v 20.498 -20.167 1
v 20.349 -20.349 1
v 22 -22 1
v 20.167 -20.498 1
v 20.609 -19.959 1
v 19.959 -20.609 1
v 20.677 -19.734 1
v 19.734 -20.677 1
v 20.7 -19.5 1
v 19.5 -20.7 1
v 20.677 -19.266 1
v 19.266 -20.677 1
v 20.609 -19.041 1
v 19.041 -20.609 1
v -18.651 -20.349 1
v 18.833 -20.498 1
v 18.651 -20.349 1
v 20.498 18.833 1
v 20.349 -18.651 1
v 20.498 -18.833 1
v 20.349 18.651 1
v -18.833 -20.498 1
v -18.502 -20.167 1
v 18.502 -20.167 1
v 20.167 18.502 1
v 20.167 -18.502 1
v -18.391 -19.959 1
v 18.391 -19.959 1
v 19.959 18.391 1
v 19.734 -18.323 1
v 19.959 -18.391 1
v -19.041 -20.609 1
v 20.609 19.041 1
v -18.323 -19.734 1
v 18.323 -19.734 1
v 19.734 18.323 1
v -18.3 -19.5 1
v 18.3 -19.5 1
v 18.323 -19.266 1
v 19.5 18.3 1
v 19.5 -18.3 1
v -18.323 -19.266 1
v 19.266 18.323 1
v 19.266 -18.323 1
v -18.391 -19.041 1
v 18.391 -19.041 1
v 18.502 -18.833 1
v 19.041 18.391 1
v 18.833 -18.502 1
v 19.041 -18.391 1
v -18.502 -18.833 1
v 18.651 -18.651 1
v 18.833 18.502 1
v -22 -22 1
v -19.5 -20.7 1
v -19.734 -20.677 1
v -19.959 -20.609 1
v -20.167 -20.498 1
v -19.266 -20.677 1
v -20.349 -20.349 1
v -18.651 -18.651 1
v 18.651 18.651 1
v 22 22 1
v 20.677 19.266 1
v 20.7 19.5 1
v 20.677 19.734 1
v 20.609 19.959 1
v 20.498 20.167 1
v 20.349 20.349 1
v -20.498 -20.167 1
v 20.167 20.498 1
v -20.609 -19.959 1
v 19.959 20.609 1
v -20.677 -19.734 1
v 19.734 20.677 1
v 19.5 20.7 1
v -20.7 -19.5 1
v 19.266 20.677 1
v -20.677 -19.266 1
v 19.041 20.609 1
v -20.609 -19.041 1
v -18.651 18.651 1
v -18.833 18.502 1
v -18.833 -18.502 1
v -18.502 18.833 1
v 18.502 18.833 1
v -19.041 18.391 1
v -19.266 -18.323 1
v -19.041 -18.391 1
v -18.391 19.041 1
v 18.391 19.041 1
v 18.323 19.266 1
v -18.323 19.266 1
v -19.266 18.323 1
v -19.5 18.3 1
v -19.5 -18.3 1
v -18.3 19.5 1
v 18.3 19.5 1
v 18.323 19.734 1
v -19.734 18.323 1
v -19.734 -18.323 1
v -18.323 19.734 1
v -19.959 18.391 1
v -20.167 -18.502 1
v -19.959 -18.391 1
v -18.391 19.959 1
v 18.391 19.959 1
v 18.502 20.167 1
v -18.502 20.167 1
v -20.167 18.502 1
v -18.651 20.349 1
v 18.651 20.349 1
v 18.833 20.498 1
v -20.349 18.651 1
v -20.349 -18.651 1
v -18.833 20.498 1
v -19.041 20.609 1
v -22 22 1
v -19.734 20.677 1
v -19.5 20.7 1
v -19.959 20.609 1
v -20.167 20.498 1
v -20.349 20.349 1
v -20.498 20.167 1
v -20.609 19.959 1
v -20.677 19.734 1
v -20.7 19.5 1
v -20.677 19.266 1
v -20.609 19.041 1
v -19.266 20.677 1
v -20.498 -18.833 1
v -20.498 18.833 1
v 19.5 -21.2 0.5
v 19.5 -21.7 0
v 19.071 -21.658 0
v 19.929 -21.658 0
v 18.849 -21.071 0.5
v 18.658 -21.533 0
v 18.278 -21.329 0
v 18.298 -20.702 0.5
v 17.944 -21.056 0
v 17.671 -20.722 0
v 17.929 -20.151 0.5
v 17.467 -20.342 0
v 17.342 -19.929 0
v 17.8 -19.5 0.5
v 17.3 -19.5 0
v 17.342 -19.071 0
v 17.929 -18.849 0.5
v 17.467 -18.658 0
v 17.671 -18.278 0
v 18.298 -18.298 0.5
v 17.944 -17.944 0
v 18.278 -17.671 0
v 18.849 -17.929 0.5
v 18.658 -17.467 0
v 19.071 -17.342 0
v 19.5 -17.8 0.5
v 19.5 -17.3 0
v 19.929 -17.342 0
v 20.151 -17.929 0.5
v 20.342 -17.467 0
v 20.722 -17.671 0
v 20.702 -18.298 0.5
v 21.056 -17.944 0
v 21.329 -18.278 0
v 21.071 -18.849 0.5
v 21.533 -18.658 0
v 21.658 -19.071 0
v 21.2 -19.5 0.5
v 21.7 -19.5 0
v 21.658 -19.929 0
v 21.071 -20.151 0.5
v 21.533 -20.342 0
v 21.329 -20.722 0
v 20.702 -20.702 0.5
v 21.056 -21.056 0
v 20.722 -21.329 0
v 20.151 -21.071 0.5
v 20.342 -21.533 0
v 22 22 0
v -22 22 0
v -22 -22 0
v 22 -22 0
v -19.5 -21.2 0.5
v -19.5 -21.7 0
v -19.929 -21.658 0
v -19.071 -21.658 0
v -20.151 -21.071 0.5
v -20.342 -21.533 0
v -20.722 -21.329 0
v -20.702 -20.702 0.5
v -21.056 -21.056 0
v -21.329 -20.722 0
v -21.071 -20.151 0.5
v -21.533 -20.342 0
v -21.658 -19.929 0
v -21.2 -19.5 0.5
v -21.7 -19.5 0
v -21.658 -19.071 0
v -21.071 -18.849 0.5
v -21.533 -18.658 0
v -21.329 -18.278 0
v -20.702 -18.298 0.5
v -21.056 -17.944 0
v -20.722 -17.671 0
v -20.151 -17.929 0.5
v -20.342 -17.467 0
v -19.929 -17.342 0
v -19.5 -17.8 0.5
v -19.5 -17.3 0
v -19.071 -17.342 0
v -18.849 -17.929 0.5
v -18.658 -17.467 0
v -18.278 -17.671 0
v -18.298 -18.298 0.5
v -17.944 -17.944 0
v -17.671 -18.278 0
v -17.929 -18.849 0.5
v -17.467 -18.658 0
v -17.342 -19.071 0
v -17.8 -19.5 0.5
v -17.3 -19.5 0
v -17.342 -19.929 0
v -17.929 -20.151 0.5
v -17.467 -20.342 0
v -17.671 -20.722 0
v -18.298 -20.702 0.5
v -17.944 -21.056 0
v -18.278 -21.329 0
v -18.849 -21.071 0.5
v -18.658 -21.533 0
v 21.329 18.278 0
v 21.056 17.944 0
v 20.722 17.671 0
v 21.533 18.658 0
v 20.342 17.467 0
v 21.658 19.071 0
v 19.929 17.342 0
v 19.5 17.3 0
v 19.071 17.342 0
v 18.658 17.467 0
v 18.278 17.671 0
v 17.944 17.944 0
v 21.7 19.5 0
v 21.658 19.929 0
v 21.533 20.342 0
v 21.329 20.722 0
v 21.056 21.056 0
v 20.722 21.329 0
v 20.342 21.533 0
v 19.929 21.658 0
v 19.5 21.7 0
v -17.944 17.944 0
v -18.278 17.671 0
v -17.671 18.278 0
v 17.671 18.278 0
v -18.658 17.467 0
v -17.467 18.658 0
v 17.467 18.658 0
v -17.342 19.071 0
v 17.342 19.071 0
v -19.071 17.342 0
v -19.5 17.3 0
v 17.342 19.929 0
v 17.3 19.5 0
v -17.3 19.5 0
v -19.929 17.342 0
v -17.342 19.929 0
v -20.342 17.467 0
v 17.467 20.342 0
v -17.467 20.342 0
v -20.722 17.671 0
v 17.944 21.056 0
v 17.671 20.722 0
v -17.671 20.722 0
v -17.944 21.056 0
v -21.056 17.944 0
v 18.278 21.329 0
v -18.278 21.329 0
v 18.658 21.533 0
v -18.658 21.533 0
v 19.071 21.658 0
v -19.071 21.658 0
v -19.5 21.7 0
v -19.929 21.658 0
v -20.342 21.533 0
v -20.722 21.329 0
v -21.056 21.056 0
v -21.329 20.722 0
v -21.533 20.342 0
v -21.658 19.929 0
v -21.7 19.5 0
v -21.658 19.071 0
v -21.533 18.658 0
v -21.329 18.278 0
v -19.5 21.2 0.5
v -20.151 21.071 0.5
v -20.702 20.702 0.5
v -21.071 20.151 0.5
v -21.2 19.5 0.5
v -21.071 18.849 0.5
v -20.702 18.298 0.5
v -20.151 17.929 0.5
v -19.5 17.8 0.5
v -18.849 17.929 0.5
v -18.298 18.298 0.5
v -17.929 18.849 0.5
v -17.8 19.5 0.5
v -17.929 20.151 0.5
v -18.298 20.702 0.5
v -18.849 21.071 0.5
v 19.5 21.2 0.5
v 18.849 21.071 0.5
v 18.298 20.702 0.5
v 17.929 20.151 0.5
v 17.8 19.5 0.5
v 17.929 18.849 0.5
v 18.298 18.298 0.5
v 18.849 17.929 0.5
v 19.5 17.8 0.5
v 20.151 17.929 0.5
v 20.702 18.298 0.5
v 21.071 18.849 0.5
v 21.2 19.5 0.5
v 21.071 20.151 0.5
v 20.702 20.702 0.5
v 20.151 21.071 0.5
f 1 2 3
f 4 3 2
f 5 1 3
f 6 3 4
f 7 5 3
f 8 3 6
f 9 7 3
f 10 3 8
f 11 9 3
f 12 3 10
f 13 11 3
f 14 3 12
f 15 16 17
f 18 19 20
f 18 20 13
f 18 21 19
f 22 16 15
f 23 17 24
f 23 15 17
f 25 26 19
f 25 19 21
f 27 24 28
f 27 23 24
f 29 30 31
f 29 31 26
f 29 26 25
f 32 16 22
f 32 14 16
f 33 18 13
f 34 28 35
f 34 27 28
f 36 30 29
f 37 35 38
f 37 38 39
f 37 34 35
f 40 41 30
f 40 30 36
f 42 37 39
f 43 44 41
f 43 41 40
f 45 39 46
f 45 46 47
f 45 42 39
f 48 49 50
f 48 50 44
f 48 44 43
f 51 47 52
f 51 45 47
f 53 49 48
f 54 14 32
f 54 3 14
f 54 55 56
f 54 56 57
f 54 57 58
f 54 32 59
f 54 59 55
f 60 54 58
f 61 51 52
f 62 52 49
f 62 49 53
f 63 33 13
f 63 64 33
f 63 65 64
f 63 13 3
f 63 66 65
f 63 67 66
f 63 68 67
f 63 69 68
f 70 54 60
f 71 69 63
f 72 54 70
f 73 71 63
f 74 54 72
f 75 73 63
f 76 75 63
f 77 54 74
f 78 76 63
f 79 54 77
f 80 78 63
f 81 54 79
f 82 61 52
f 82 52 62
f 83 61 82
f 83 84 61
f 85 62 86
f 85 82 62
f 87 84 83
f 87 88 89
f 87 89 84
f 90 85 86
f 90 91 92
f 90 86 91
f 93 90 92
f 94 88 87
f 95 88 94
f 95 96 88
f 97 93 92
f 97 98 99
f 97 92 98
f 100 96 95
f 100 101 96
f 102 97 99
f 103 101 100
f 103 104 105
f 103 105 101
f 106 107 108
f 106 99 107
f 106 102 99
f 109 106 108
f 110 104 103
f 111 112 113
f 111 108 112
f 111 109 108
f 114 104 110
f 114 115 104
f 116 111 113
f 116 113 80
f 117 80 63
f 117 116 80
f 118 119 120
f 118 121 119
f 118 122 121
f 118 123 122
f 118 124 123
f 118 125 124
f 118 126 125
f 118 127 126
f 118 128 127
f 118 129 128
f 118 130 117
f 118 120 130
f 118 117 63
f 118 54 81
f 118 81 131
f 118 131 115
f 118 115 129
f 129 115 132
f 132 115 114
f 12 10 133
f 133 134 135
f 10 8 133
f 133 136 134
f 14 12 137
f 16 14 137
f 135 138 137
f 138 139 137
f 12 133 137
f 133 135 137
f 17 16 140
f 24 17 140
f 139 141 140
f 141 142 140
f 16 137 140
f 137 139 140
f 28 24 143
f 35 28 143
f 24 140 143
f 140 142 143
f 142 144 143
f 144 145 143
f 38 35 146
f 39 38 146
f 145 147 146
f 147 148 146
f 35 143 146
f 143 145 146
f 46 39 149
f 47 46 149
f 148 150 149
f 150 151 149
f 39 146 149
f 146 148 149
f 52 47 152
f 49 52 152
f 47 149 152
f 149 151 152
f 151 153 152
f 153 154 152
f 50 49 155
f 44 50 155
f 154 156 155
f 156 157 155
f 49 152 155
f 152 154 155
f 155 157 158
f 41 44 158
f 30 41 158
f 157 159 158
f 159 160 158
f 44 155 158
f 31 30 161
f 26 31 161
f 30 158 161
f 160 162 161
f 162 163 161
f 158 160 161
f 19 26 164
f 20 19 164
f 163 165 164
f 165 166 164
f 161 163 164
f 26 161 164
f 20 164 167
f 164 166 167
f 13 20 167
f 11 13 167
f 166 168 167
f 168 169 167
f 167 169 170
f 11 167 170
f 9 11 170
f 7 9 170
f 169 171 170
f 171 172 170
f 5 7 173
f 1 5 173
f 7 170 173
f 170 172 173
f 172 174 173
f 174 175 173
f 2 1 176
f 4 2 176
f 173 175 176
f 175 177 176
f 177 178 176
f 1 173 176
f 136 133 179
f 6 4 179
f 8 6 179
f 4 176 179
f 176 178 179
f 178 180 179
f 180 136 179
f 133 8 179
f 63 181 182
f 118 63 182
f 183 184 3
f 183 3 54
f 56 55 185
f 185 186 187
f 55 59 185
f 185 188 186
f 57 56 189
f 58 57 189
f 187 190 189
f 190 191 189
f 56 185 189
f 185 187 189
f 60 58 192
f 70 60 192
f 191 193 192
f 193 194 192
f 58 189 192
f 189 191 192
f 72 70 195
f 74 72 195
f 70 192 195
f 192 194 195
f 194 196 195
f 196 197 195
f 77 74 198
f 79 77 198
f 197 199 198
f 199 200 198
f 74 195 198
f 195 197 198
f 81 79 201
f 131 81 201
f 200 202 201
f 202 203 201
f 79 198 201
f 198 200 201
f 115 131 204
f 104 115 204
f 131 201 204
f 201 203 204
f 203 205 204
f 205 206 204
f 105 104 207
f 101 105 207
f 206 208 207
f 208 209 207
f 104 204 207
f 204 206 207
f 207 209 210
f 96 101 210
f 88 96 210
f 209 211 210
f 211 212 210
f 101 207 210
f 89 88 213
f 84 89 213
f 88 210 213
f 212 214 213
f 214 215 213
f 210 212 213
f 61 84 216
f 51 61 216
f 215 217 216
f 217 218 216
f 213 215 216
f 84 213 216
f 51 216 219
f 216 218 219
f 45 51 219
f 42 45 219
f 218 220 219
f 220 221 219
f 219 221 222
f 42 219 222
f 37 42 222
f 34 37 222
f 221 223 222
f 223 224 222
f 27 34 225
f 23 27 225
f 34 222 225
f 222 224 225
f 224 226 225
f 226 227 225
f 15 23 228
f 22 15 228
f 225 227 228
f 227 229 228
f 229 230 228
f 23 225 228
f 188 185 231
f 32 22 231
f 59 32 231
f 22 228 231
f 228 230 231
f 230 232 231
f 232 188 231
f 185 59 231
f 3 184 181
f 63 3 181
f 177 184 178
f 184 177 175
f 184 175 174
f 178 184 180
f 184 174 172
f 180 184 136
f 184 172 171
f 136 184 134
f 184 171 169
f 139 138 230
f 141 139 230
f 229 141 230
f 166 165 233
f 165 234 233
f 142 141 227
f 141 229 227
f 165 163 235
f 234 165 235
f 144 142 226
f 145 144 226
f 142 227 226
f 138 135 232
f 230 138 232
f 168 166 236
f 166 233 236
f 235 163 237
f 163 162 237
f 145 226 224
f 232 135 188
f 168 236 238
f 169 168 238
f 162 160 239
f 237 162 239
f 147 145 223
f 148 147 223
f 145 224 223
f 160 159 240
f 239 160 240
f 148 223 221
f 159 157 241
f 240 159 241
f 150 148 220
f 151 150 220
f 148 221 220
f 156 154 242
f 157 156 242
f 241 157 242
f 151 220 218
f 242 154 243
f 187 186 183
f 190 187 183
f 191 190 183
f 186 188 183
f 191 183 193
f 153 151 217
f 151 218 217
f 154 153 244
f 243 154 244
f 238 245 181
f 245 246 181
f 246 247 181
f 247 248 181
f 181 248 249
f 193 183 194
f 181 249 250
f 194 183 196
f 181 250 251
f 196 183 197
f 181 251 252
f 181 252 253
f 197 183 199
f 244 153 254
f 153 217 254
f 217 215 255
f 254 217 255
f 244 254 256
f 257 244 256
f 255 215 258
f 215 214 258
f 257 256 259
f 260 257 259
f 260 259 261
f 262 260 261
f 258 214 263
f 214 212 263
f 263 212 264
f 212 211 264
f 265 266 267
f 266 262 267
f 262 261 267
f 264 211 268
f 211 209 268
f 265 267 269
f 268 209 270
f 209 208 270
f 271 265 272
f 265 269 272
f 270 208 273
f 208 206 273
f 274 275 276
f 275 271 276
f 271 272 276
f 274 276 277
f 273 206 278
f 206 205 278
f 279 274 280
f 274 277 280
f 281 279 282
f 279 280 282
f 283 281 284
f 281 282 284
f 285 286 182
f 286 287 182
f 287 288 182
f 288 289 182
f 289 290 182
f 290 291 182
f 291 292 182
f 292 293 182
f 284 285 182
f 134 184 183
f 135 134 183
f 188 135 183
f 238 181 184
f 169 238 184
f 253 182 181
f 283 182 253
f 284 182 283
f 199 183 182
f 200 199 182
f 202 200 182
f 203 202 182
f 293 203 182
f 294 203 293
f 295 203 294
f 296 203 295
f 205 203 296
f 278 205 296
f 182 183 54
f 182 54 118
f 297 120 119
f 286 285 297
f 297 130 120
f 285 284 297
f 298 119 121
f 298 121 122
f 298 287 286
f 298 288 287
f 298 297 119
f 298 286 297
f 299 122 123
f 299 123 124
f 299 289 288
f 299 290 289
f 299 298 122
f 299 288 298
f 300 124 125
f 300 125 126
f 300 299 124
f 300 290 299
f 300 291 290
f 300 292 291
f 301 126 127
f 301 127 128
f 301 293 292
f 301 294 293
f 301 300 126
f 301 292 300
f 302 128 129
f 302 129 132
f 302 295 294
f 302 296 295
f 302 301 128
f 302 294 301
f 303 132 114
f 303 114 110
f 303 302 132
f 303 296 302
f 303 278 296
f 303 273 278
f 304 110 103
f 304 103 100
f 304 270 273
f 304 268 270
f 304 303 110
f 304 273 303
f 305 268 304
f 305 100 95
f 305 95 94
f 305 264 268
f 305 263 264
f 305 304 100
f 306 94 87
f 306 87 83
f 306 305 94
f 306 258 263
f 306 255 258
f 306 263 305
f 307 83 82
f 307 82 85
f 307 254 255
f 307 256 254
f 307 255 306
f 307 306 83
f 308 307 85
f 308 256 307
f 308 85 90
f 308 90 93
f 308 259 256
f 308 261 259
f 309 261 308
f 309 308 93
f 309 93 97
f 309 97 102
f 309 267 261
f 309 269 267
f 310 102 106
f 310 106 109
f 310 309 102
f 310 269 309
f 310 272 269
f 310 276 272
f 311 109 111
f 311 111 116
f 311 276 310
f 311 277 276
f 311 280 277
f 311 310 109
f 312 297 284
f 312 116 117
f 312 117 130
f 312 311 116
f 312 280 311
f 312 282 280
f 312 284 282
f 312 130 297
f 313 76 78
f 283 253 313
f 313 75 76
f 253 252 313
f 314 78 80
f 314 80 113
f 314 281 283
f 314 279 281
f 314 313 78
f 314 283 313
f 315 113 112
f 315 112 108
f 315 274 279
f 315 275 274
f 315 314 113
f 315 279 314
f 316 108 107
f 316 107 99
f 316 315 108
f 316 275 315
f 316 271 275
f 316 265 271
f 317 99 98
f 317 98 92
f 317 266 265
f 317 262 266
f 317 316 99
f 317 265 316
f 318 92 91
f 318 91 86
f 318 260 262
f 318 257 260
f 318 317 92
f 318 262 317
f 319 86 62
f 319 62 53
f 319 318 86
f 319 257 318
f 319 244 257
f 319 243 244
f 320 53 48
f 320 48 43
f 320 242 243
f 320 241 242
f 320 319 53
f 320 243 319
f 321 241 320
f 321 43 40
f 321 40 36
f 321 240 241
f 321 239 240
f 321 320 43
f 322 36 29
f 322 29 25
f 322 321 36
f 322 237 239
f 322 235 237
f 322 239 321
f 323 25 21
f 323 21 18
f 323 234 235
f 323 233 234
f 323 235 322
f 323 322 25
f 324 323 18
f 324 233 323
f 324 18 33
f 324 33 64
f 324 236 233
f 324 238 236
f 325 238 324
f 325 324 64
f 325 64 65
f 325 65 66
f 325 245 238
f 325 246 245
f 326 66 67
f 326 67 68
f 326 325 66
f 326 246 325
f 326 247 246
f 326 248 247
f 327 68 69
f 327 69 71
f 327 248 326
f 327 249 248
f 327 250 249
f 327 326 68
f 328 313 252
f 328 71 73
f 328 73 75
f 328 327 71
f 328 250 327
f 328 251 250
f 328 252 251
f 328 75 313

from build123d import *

# Parameters (mm, degrees)
ESQUISSE1_W                                 = 44
ESQUISSE1_H                                 = 44
BOSS_EXTRU_1_DEPTH                          = 1
FRAISAGE_POUR_VIS_T_TE_FRAIS_E_M21_AT_COUNT = 2
FRAISAGE_POUR_VIS_T_TE_FRAIS_E_M21_AT_PITCH = 39


with BuildPart() as part:
    # Esquisse1 → Boss.-Extru.1 (new body)
    with BuildSketch(Plane(origin=(0, 0, 0), x_dir=(0, 1, 0), z_dir=(0, 0, 1))):
        Rectangle(ESQUISSE1_W, ESQUISSE1_H)
    extrude(amount=BOSS_EXTRU_1_DEPTH)

    # Esquisse3 → Fraisage pour vis à tête fraisée M21 (revolve, cut)
    with BuildSketch(Plane(origin=(19.5, 19.5, 0), x_dir=(0, 1, 0), z_dir=(1, 0, 0))):
        Polygon((0, 0), (0, 2), (1.2, 2), (1.2, 1), (2.2, 0), align=None)
    fraisage_pour_vis_t_te_frais_e_m21 = revolve(axis=Axis((19.5, 19.5, -6.35), (0, 0, 1)), mode=Mode.SUBTRACT)

    # Fraisage pour vis à tête fraisée M21 at: Fraisage pour vis à tête fraisée M21 ×2
    with Locations(*[(-i * FRAISAGE_POUR_VIS_T_TE_FRAIS_E_M21_AT_PITCH, 0, 0) for i in range(1, FRAISAGE_POUR_VIS_T_TE_FRAIS_E_M21_AT_COUNT)]):
        add(fraisage_pour_vis_t_te_frais_e_m21, mode=Mode.SUBTRACT)

    # Symétrie2: Fraisage pour vis à tête fraisée M21 across plane
    add(fraisage_pour_vis_t_te_frais_e_m21.mirror(Plane.ZX), mode=Mode.SUBTRACT)

    # Symétrie2 copy 1 sketch → Symétrie2 copy 1 (revolve, cut)
    with BuildSketch(Plane(origin=(-19.5, -19.5, 0), x_dir=(0, -1, 0), z_dir=(1, 0, 0))):
        Polygon((0, 0), (0, -2), (1.2, -2), (1.2, -1), (2.2, 0), align=None)
    revolve(axis=Axis((-19.5, -19.5, -6.35), (0, 0, -1)), mode=Mode.SUBTRACT)


solid = part.part
